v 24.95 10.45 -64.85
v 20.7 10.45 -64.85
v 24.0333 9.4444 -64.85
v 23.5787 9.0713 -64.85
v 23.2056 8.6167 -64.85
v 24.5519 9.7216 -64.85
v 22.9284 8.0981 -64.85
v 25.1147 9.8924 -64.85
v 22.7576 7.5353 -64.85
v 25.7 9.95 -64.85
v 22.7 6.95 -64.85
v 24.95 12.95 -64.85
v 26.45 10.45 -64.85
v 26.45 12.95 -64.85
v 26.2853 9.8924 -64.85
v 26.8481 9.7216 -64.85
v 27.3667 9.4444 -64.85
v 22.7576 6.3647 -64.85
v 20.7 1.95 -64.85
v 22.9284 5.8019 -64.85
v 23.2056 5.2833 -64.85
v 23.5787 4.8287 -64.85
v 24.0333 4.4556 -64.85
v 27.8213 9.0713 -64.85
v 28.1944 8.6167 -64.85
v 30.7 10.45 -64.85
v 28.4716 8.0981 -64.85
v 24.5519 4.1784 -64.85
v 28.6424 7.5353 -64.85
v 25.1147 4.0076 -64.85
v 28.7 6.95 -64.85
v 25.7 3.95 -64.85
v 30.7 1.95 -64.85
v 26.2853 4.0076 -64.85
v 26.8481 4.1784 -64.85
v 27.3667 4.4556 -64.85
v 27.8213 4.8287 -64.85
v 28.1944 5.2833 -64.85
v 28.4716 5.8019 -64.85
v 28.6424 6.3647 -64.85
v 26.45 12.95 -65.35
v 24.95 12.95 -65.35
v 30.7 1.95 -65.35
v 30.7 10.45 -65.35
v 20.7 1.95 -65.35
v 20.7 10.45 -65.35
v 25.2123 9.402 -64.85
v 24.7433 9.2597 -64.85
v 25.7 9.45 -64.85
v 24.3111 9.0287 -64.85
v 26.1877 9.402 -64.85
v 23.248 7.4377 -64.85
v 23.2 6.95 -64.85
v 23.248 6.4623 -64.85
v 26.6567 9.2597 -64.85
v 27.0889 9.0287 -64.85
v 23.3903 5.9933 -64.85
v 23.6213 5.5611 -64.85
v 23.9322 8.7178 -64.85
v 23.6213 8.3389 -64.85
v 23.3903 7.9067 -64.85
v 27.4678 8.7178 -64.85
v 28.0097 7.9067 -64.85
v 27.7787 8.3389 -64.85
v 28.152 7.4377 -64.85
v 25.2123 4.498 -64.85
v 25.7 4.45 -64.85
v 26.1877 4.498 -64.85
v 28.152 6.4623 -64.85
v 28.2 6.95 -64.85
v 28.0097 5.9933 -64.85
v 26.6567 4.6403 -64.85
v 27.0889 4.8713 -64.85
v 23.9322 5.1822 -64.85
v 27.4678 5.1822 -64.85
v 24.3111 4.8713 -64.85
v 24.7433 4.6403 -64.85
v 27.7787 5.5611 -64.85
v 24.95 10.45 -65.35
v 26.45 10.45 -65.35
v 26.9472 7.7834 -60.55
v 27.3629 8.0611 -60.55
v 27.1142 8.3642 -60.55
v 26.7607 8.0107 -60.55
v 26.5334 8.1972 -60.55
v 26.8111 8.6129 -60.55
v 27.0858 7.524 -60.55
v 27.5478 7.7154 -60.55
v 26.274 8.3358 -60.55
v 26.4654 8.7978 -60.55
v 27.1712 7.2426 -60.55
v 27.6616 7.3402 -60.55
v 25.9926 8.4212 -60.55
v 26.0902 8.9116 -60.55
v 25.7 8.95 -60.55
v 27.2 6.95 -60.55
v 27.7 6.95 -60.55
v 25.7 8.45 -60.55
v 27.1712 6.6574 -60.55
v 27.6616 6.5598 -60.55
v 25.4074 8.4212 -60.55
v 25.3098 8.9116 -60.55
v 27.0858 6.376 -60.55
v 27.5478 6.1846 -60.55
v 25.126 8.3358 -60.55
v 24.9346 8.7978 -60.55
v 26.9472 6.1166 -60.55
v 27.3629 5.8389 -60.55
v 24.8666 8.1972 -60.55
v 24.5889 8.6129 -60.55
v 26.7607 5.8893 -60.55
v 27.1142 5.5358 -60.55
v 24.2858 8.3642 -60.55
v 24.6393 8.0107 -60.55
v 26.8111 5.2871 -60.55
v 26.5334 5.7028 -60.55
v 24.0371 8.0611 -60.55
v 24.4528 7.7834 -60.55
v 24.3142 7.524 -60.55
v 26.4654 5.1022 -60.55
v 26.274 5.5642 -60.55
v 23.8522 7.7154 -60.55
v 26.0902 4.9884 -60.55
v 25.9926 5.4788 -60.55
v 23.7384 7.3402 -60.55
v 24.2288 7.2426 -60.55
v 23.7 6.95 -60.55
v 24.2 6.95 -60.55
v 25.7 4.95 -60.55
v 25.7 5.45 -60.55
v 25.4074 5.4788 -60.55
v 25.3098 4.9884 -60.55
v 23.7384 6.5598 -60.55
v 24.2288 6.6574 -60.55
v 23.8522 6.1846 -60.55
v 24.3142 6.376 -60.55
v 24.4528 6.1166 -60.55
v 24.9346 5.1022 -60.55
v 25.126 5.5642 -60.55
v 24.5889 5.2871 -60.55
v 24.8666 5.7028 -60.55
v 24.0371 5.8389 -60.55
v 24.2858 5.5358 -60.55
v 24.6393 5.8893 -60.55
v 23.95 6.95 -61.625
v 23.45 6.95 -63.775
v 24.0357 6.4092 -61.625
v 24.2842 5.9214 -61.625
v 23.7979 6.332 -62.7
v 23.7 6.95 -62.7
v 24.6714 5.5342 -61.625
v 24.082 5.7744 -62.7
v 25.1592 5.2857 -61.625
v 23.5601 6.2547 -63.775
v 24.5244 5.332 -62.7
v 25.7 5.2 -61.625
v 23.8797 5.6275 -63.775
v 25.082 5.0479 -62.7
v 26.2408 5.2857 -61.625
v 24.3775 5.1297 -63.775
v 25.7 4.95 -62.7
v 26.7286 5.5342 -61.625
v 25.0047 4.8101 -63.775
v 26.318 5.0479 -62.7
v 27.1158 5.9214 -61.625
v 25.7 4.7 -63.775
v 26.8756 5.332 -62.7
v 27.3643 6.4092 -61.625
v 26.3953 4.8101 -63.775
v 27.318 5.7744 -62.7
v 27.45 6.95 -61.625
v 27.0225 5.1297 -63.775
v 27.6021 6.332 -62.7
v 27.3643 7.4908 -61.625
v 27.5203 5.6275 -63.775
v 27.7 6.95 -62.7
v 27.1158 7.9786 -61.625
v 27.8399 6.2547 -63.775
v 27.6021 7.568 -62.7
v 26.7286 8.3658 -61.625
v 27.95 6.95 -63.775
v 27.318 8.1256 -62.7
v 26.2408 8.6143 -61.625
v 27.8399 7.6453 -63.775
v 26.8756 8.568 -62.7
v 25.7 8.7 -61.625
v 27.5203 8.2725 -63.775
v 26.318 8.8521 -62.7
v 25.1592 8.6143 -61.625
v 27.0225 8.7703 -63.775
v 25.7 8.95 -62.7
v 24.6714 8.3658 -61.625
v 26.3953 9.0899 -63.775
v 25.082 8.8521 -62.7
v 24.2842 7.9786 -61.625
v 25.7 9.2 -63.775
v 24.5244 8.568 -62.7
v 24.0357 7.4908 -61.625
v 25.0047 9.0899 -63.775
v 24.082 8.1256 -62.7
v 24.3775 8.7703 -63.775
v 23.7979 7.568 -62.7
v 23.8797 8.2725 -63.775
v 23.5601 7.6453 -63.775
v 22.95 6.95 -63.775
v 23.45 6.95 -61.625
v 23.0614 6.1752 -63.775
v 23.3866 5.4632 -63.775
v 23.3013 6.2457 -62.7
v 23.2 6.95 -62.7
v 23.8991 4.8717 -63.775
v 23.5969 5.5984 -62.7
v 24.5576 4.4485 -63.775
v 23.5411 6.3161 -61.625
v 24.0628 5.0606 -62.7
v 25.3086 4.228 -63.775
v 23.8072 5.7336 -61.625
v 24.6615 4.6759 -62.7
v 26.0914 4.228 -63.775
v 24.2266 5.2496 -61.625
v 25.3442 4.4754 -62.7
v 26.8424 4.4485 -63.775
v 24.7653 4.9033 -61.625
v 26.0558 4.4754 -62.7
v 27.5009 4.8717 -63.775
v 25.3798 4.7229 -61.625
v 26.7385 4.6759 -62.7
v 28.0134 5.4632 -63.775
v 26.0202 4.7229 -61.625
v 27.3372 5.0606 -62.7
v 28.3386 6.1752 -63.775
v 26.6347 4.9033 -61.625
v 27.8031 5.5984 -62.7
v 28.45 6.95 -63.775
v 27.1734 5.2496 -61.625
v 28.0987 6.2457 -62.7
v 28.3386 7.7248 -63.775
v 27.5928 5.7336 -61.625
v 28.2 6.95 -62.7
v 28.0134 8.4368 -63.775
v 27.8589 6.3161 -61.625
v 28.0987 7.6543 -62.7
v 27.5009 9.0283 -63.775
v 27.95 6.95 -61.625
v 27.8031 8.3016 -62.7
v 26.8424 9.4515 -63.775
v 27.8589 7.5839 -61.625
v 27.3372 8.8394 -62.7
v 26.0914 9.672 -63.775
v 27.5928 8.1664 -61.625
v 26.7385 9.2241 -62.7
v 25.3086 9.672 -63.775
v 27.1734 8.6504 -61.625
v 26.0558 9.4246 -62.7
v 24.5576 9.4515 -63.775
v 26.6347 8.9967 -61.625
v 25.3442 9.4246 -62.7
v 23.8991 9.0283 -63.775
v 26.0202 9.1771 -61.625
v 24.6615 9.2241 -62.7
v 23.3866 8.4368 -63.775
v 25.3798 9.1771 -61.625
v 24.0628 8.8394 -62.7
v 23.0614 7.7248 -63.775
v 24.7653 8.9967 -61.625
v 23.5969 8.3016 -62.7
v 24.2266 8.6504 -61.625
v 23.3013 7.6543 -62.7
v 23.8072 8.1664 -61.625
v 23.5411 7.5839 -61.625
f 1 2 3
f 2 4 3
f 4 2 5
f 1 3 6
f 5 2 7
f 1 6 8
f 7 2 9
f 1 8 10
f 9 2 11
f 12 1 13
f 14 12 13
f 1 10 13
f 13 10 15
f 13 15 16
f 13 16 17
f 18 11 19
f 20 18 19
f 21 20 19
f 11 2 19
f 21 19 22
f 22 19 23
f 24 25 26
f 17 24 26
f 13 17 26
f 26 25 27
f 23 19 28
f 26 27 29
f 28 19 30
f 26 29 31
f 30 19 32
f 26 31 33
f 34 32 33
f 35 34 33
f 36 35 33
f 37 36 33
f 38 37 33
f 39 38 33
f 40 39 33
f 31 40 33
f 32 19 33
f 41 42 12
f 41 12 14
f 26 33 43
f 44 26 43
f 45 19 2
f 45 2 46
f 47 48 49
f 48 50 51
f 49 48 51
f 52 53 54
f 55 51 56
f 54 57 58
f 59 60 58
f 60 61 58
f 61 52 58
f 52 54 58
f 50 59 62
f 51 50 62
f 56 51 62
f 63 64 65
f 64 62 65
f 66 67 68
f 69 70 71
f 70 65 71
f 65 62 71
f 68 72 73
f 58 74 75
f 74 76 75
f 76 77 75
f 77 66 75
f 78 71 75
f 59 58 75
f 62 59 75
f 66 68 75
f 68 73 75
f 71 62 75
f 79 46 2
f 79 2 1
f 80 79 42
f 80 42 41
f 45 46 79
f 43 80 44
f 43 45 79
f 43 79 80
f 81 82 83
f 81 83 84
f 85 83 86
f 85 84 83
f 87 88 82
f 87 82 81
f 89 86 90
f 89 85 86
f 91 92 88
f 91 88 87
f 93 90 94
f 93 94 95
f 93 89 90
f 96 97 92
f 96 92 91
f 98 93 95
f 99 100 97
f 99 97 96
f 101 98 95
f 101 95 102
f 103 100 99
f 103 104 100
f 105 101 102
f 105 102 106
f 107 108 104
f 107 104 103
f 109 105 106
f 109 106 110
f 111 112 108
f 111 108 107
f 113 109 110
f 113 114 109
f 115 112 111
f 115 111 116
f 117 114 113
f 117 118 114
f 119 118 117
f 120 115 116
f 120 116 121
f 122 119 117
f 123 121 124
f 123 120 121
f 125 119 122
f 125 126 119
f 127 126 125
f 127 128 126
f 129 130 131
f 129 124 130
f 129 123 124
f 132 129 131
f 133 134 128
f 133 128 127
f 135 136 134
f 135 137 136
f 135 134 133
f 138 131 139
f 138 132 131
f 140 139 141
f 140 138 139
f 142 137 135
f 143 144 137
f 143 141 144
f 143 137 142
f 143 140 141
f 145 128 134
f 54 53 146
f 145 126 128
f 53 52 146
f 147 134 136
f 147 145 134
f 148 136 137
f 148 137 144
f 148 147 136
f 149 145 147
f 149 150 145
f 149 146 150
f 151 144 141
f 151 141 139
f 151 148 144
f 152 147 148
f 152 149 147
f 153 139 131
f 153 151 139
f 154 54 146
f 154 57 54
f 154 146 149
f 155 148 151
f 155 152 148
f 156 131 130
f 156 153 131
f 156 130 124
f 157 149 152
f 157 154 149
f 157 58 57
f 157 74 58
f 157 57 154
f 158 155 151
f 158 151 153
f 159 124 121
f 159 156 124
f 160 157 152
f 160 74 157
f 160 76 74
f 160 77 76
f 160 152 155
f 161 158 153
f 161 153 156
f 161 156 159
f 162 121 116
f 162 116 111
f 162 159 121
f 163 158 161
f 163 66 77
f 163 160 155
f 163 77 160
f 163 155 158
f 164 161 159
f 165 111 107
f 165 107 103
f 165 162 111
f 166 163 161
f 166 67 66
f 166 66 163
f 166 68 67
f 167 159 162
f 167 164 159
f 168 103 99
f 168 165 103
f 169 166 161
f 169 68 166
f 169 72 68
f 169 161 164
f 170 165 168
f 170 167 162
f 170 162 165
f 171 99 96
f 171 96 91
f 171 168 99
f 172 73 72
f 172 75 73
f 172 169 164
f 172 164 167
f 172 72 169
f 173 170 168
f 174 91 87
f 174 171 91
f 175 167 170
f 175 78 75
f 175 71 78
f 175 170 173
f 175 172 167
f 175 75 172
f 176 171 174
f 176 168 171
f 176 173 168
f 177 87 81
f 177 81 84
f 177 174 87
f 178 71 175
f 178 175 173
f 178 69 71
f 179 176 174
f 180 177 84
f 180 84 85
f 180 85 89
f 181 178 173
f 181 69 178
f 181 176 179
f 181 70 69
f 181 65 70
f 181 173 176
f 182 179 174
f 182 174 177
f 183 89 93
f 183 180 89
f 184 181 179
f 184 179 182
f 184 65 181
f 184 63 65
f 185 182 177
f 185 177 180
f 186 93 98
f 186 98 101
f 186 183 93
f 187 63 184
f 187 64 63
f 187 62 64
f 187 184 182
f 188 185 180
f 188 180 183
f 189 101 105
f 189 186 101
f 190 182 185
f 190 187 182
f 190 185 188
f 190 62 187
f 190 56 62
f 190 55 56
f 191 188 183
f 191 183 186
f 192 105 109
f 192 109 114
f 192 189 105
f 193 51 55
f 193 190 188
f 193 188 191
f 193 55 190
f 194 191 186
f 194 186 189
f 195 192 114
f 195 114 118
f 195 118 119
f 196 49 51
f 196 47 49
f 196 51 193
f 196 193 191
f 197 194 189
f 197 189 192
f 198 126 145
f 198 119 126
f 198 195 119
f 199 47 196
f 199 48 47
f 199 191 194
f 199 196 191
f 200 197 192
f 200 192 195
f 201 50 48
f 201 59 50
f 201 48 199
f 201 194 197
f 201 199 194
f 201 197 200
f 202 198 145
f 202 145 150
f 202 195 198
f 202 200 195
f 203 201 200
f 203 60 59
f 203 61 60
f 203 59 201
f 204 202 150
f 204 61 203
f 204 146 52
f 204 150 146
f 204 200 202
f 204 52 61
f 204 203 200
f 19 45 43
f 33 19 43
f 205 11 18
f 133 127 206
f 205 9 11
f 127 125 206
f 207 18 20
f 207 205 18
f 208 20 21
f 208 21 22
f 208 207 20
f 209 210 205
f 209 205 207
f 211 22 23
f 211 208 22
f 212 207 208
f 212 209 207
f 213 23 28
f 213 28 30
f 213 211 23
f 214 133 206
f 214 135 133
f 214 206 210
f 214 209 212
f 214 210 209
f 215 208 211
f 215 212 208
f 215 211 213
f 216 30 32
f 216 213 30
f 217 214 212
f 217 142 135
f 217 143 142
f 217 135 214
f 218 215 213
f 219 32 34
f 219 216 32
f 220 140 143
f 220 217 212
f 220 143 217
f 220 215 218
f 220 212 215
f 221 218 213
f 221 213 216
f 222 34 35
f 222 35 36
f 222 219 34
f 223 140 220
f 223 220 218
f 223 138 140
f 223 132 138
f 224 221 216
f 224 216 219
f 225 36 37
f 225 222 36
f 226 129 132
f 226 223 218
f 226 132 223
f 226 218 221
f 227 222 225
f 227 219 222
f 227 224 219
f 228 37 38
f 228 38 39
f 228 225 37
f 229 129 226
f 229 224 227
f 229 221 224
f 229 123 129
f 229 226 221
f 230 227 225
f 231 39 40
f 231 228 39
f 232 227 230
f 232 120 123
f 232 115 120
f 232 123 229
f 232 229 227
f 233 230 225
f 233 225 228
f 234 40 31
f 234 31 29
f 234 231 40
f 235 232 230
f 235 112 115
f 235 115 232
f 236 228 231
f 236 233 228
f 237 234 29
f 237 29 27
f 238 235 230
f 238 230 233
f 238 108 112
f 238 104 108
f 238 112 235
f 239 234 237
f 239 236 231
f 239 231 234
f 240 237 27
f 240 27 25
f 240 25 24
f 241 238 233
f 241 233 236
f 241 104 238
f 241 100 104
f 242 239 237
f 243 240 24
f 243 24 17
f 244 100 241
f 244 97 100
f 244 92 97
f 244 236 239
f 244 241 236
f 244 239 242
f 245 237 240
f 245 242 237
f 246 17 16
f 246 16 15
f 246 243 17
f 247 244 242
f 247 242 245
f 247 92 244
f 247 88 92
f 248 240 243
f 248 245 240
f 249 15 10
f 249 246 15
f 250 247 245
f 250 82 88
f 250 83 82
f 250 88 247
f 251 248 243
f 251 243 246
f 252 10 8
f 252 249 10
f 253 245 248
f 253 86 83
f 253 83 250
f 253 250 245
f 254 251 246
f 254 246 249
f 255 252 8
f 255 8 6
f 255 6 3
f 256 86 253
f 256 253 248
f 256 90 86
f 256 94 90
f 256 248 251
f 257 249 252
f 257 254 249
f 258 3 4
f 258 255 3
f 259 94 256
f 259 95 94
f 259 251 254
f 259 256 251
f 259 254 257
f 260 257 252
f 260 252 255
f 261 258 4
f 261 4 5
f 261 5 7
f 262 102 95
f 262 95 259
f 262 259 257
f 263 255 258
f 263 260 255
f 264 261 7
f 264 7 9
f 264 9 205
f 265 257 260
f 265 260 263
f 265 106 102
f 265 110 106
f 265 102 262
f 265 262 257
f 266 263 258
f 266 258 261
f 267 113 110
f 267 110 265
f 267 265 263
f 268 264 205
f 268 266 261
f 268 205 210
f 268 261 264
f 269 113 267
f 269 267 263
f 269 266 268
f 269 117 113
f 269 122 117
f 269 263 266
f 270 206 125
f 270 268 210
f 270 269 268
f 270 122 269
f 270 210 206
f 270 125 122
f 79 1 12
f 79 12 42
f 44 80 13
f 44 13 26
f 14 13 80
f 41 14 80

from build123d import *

# Parameters (mm, degrees)
MINUS_PLATE_10_X_8_5_X_0_5_SKETCH_W = 10
MINUS_PLATE_10_X_8_5_X_0_5_SKETCH_H = 0.5
MINUS_PLATE_10_X_8_5_X_0_5_DEPTH    = 8.5
SOLDER_TAB_1_5_X_2_5_SKETCH_W       = 1.5
SOLDER_TAB_1_5_X_2_5_SKETCH_H       = 0.5
SOLDER_TAB_1_5_X_2_5_DEPTH          = 2.5


with BuildPart() as part:
    # Minus Plate 10 x 8.5 x 0.5 Sketch → Minus Plate 10 x 8.5 x 0.5 (new body)
    with BuildSketch(Plane(origin=(0, 1.95, 0), x_dir=(1, 0, 0), z_dir=(0, 1, 0))):
        with Locations((25.7, 65.1)):
            Rectangle(MINUS_PLATE_10_X_8_5_X_0_5_SKETCH_W, MINUS_PLATE_10_X_8_5_X_0_5_SKETCH_H)
    extrude(amount=MINUS_PLATE_10_X_8_5_X_0_5_DEPTH)

    # Solder Tab 1.5 x 2.5 Sketch → Solder Tab 1.5 x 2.5 (add)
    with BuildSketch(Plane(origin=(0, 10.45, 0), x_dir=(1, 0, 0), z_dir=(0, 1, 0))):
        with Locations((25.7, 65.1)):
            Rectangle(SOLDER_TAB_1_5_X_2_5_SKETCH_W, SOLDER_TAB_1_5_X_2_5_SKETCH_H)
    extrude(amount=SOLDER_TAB_1_5_X_2_5_DEPTH)

    # Spring (compressed 4.3) Sketch → Spring (compressed 4.3) (revolve)
    with BuildSketch(Plane(origin=(0, 6.95, 0), x_dir=(1, 0, 0), z_dir=(0, 1, 0)), mode=Mode.PRIVATE) as spring_compressed_4_3_sk:
        Polygon((28.2, 64.85), (28.7, 64.85), (27.7, 60.55), (27.2, 60.55), align=None)
    revolve(spring_compressed_4_3_sk.sketch.rotate(Axis((25.7, 6.95, -65.85), (0, 0, 1)), 180), axis=Axis((25.7, 6.95, -65.85), (0, 0, 1)))


solid = part.part
